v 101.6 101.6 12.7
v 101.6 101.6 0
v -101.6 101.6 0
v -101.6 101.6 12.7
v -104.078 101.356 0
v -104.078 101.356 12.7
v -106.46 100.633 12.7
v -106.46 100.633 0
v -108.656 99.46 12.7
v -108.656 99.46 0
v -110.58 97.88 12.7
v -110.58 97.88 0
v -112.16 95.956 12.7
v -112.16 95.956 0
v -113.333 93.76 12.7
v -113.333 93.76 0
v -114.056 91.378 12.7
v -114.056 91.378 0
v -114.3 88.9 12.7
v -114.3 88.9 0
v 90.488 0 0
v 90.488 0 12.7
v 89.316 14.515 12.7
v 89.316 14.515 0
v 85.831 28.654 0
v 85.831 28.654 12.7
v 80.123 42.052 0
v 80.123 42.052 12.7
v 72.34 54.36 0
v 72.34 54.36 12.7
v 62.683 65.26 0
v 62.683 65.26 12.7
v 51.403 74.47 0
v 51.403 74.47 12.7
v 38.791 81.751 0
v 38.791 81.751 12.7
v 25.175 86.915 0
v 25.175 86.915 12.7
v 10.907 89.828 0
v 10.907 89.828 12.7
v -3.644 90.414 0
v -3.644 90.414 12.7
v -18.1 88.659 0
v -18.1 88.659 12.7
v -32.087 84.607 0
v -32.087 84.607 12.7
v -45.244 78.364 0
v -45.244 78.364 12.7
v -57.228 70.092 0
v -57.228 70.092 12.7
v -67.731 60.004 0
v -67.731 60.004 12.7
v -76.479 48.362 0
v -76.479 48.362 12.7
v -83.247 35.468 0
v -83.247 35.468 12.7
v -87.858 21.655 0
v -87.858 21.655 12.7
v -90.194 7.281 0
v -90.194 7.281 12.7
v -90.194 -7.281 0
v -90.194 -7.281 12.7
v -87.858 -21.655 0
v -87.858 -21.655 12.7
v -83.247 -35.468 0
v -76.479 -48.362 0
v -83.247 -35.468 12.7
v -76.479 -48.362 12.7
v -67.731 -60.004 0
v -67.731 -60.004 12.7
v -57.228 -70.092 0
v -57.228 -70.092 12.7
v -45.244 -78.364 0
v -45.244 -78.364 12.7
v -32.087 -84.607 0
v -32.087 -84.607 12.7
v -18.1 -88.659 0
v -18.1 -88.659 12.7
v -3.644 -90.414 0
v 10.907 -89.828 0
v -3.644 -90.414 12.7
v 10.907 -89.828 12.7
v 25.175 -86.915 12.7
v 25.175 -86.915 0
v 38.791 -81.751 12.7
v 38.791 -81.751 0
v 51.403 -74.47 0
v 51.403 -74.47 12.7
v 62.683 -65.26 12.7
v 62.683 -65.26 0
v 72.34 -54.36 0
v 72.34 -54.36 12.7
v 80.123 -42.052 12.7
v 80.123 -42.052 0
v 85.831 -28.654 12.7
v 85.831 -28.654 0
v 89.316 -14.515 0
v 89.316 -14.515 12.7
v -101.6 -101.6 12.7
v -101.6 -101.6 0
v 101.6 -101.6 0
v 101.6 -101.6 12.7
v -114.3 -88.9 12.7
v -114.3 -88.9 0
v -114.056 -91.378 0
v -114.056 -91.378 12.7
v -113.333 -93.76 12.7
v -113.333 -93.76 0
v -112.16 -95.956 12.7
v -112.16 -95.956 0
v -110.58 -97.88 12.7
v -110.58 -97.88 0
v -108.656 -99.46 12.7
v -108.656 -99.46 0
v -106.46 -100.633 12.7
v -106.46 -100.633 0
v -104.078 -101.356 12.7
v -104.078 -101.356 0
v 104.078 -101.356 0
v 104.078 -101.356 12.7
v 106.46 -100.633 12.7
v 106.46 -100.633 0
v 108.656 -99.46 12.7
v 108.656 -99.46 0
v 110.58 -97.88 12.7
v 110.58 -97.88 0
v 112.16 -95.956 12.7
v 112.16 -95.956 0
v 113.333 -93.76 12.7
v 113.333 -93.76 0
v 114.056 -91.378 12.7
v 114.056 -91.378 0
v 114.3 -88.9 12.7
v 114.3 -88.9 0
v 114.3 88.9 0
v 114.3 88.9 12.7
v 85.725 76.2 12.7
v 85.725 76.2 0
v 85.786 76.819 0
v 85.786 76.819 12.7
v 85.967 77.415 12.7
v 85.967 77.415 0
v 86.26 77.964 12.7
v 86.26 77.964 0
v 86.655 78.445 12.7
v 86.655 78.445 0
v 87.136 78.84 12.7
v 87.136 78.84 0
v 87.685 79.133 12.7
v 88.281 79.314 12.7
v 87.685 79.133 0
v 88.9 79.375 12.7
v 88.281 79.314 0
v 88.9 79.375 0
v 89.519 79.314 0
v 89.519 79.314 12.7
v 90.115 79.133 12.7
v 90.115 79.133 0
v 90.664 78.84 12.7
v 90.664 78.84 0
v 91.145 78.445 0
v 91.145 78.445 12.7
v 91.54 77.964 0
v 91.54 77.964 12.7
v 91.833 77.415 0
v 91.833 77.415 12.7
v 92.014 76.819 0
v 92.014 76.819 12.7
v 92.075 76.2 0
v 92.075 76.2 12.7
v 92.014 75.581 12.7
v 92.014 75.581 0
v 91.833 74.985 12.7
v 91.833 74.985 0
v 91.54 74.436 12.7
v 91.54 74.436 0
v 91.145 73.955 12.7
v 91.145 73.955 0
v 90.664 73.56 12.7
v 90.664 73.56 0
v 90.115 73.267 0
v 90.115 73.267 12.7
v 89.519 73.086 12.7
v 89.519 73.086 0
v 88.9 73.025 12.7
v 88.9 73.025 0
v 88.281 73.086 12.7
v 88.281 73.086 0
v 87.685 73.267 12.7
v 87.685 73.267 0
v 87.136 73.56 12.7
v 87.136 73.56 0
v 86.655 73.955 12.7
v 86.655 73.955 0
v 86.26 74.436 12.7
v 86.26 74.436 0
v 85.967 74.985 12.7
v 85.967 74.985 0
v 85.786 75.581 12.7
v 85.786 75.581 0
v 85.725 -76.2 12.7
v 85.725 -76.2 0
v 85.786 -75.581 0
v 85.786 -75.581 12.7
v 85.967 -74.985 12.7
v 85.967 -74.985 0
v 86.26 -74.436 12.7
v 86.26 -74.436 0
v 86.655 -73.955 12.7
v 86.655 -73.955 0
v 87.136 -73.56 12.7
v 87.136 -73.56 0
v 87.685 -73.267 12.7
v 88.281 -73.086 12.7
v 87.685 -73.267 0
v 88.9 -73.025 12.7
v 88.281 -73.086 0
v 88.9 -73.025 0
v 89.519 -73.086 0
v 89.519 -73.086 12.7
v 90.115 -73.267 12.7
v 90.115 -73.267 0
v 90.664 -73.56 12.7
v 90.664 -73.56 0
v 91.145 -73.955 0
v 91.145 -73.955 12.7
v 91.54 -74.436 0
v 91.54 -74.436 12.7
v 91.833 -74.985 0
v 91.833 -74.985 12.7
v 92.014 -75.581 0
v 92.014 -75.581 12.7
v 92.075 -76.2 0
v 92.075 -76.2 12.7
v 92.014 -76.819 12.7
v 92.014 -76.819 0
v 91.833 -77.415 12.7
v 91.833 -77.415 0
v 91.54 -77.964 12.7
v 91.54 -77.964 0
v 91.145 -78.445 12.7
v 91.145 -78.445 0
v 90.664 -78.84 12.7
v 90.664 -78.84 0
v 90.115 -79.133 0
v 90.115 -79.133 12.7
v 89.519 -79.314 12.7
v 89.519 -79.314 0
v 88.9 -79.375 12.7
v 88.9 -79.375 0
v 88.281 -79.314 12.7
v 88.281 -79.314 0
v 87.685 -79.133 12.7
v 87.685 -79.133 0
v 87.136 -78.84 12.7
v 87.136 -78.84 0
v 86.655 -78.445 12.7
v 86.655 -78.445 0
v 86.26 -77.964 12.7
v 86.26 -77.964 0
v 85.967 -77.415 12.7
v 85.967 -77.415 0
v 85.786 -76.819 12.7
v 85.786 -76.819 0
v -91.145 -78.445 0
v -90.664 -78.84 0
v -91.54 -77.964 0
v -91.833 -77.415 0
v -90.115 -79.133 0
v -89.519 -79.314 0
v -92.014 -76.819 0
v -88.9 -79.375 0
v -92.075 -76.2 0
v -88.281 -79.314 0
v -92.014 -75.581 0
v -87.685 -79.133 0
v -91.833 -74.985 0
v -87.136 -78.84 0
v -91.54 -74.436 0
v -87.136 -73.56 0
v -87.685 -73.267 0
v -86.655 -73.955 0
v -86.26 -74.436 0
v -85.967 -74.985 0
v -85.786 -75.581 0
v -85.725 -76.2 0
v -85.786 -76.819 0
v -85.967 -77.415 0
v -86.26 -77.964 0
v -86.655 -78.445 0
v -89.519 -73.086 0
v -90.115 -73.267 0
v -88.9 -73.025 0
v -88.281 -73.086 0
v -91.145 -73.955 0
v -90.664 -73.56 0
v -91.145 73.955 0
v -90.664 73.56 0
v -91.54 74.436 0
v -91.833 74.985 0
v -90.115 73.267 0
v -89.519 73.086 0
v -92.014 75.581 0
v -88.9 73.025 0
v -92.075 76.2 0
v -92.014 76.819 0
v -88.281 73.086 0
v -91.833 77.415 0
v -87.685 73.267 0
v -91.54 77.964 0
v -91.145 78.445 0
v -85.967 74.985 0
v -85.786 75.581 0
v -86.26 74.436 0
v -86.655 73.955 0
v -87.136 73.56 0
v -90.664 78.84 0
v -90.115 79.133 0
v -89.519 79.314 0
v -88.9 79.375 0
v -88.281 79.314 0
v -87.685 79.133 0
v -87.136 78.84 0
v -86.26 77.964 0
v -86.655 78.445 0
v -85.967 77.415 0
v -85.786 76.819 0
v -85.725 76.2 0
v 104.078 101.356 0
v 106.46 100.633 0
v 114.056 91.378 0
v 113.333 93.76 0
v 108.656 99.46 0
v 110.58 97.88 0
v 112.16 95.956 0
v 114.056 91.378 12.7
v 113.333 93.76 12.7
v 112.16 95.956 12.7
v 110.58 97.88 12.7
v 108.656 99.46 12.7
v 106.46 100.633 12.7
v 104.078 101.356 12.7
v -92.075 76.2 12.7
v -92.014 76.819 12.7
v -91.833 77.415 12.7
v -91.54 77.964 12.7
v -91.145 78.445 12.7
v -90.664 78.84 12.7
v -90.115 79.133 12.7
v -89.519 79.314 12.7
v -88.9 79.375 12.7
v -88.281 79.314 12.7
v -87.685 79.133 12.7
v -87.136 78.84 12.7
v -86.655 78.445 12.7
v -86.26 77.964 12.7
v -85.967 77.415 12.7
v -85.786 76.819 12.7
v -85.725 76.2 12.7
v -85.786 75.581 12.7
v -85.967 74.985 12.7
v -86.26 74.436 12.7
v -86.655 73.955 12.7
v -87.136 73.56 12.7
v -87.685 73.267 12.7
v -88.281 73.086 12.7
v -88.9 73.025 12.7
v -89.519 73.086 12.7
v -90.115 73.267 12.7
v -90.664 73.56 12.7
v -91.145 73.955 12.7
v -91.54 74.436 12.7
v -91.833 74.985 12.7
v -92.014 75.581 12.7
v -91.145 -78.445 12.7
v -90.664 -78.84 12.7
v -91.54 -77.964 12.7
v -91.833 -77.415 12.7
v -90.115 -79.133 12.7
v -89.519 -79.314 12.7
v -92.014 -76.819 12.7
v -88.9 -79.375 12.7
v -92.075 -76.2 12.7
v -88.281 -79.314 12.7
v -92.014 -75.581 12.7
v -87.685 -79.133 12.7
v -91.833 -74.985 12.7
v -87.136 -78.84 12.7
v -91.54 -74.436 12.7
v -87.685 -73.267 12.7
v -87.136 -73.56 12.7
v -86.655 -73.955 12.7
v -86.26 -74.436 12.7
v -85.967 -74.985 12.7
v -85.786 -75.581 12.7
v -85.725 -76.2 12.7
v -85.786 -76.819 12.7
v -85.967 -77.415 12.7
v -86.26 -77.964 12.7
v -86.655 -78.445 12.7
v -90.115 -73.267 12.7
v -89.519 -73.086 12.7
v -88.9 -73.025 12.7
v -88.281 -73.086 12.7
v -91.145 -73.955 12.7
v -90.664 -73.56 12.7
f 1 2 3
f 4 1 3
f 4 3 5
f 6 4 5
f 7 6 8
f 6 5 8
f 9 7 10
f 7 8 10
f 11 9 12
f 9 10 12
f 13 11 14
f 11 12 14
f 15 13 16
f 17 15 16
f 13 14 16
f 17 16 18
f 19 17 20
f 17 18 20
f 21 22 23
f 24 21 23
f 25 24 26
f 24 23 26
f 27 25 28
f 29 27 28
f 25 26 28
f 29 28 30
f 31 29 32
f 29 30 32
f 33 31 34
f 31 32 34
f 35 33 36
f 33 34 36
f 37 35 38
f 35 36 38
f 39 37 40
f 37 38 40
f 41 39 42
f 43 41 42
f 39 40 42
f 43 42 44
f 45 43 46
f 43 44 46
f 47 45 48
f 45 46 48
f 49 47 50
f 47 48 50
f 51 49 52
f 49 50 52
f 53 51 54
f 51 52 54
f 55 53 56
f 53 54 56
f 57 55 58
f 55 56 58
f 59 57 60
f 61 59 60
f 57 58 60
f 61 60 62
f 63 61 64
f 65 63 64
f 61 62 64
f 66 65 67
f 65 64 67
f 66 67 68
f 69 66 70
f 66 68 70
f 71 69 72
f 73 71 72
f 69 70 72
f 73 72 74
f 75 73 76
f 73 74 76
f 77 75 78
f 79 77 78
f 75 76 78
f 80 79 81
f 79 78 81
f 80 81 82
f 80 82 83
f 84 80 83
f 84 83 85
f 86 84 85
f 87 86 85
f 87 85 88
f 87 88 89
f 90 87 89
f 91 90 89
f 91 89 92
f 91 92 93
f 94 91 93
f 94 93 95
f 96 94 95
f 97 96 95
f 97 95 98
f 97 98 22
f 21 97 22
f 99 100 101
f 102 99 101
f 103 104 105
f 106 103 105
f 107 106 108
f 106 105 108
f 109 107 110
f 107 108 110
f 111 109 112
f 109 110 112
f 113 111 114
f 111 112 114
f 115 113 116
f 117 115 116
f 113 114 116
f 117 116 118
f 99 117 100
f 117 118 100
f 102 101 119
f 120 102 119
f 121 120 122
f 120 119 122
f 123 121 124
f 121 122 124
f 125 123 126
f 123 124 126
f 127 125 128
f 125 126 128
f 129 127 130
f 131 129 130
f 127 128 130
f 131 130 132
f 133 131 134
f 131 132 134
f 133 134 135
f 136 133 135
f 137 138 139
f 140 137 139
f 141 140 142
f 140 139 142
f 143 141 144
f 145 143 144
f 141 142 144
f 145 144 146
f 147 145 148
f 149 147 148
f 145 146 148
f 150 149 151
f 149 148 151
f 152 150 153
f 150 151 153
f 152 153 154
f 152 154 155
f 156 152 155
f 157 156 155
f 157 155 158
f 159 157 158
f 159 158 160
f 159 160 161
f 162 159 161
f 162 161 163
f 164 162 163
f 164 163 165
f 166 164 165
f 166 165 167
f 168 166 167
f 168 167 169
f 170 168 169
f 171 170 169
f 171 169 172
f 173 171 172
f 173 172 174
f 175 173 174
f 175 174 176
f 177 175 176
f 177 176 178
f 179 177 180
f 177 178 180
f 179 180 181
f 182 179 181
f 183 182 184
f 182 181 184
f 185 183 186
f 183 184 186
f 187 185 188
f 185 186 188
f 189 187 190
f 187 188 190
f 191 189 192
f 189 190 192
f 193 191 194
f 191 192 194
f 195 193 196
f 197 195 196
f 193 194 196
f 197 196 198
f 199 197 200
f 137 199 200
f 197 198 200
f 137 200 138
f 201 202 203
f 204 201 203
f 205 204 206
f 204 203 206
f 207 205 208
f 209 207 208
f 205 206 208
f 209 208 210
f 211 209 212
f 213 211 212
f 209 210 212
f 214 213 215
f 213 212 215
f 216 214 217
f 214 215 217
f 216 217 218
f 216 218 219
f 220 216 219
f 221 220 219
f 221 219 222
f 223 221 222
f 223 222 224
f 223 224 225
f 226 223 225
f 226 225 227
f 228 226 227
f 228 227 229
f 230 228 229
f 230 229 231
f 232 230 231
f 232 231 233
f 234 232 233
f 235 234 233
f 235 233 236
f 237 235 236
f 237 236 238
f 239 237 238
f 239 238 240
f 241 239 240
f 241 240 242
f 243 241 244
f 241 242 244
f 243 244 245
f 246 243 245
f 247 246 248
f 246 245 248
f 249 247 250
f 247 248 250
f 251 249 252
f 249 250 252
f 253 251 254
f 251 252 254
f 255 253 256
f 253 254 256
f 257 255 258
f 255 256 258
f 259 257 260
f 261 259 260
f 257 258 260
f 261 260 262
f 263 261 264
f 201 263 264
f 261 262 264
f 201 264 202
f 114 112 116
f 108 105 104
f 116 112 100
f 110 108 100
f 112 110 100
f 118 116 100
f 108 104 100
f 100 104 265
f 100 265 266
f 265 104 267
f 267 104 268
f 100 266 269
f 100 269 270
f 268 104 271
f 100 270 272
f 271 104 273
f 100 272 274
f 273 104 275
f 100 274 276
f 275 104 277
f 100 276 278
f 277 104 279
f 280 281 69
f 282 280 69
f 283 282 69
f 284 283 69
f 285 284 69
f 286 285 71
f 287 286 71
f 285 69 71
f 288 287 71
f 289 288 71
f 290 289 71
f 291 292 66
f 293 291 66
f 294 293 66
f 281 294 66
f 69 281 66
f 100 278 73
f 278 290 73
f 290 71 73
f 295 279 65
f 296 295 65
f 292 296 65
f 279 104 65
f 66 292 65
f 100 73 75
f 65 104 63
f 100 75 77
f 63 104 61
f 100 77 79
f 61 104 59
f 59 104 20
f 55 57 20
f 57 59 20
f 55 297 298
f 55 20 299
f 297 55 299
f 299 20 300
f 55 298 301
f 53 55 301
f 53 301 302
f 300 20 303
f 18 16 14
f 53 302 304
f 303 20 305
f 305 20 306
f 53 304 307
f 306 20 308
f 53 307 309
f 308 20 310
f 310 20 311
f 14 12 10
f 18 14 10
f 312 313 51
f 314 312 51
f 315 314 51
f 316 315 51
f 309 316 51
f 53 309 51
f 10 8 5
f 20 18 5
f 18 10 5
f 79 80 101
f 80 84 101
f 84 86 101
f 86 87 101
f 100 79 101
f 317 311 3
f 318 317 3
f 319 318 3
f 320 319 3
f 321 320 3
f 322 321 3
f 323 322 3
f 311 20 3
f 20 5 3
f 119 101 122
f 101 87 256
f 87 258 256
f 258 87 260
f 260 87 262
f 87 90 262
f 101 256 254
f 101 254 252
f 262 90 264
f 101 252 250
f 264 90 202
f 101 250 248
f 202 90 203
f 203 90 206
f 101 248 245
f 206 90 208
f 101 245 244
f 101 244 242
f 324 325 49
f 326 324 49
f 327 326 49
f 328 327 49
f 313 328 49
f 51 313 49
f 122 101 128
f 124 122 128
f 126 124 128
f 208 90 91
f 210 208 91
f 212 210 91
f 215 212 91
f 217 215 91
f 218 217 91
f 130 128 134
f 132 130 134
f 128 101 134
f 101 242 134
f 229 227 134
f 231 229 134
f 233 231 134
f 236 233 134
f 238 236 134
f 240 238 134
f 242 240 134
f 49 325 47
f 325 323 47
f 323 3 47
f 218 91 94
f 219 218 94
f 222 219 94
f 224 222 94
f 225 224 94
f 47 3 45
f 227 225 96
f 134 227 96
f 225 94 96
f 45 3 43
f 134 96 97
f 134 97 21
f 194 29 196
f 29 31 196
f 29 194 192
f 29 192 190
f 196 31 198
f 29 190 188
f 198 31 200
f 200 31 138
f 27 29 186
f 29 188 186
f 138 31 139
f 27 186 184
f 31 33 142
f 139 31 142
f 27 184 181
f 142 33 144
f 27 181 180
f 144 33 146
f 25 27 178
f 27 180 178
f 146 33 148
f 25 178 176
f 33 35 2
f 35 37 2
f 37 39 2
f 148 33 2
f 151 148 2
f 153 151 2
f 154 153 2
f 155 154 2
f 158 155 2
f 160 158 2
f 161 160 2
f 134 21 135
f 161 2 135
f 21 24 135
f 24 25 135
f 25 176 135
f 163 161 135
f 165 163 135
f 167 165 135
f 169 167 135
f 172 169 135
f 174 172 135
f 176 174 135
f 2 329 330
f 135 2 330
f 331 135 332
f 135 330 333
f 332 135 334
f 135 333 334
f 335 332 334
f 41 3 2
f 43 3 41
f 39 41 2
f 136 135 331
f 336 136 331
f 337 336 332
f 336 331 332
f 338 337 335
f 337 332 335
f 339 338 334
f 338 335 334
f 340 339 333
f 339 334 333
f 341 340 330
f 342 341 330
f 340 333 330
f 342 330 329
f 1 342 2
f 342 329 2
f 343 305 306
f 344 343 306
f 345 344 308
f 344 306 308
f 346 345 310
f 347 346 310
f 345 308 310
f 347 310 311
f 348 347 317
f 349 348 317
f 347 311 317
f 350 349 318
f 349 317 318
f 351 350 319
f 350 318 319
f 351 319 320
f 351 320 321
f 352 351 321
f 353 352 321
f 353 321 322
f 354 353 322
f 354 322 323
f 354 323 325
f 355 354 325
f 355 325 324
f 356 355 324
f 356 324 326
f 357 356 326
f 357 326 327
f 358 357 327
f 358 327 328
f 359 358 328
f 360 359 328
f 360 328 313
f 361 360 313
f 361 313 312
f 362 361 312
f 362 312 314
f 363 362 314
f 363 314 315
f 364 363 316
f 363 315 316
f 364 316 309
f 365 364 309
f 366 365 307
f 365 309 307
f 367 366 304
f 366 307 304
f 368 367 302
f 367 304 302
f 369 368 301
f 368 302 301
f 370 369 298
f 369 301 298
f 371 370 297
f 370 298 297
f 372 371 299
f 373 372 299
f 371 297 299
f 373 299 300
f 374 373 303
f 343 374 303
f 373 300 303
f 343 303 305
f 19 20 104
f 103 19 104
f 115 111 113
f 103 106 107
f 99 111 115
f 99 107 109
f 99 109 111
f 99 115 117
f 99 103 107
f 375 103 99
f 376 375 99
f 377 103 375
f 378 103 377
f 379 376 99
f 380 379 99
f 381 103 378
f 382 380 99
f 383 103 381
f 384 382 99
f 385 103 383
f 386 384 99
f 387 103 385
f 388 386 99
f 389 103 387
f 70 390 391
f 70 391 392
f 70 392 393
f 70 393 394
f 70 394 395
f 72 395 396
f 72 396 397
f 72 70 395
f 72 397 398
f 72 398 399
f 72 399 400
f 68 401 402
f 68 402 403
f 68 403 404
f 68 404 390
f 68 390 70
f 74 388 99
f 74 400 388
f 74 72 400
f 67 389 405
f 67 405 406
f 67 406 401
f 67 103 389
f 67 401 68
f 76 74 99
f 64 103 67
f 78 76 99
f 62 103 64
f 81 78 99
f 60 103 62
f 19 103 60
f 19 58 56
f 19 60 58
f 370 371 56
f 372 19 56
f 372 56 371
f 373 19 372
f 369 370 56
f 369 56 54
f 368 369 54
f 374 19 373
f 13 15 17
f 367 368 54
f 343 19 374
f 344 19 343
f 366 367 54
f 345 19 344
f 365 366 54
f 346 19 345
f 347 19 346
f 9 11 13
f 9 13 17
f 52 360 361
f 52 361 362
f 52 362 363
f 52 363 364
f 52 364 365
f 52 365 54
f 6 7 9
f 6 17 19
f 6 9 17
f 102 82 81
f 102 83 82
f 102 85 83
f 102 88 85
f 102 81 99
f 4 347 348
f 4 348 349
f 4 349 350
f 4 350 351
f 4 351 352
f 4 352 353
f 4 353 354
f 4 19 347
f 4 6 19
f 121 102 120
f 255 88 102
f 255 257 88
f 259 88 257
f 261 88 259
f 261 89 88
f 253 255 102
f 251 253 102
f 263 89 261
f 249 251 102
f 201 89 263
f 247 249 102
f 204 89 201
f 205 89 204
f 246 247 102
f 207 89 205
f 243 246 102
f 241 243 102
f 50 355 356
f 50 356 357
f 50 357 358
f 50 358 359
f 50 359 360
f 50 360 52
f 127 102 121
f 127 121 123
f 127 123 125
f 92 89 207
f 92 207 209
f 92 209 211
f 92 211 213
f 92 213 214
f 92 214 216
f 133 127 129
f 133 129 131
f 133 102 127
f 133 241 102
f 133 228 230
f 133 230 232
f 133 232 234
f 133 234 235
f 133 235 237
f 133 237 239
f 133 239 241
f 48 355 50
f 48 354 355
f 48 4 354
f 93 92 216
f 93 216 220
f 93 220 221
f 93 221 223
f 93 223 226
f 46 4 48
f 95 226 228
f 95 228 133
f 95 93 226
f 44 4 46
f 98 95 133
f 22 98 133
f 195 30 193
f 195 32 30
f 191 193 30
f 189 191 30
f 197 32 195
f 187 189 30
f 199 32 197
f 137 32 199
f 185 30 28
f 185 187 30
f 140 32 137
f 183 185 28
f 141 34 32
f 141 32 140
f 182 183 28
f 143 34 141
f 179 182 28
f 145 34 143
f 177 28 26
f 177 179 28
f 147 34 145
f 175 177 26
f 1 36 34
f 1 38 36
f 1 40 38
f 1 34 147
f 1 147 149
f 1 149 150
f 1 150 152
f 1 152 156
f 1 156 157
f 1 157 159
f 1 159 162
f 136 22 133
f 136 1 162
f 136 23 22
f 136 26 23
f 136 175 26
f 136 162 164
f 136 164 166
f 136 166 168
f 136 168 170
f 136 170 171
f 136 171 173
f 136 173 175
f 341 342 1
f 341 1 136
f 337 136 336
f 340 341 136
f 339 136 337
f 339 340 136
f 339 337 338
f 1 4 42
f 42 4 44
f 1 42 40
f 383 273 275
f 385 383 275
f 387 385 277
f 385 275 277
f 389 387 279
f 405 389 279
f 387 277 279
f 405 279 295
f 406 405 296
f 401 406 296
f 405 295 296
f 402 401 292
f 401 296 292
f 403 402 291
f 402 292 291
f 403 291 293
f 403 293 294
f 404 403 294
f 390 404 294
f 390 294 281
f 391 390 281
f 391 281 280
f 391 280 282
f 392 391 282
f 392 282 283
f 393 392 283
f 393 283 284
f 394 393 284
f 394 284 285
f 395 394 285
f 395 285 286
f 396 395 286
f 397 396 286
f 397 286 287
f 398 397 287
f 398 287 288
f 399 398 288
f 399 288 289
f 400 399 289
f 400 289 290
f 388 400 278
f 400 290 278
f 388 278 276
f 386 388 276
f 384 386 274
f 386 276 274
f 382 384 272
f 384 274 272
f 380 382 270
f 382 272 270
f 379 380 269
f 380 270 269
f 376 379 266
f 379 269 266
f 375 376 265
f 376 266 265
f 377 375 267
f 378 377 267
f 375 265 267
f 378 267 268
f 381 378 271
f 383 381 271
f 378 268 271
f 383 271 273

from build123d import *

# Parameters (mm, degrees)
F1_DEPTH = 12.7
F2_R     = 90.4875
F3_DEPTH = 12.7
F5_D     = 6.35


with BuildPart() as f1:
    # F0 (on Top) → F1 (new body)
    with BuildSketch(Plane.XY):
        with BuildLine():
            Line((101.6, 101.6), (-101.6, 101.6))
            ThreePointArc((-101.6, 101.6), (-110.580256, 97.880256), (-114.3, 88.9))
            Line((-114.3, 88.9), (-114.3, -88.9))
            ThreePointArc((-114.3, -88.9), (-110.580256, -97.880256), (-101.6, -101.6))
            Line((-101.6, -101.6), (101.6, -101.6))
            ThreePointArc((101.6, -101.6), (110.580256, -97.880256), (114.3, -88.9))
            Line((114.3, -88.9), (114.3, 88.9))
            ThreePointArc((114.3, 88.9), (110.580256, 97.880256), (101.6, 101.6))
        make_face()
    extrude(amount=F1_DEPTH)

    # F2 (on face) → F3 (cut)
    with BuildSketch(Plane.XY.offset(12.7)):
        Circle(F2_R)
    extrude(amount=-F3_DEPTH, mode=Mode.SUBTRACT)

    # F5 (through all)
    with Locations(Plane.XY.offset(12.7)):
        with Locations((-88.9, 76.2), (88.9, 76.2), (88.9, -76.2), (-88.9, -76.2)):
            Hole(F5_D / 2)


solid = f1.part
